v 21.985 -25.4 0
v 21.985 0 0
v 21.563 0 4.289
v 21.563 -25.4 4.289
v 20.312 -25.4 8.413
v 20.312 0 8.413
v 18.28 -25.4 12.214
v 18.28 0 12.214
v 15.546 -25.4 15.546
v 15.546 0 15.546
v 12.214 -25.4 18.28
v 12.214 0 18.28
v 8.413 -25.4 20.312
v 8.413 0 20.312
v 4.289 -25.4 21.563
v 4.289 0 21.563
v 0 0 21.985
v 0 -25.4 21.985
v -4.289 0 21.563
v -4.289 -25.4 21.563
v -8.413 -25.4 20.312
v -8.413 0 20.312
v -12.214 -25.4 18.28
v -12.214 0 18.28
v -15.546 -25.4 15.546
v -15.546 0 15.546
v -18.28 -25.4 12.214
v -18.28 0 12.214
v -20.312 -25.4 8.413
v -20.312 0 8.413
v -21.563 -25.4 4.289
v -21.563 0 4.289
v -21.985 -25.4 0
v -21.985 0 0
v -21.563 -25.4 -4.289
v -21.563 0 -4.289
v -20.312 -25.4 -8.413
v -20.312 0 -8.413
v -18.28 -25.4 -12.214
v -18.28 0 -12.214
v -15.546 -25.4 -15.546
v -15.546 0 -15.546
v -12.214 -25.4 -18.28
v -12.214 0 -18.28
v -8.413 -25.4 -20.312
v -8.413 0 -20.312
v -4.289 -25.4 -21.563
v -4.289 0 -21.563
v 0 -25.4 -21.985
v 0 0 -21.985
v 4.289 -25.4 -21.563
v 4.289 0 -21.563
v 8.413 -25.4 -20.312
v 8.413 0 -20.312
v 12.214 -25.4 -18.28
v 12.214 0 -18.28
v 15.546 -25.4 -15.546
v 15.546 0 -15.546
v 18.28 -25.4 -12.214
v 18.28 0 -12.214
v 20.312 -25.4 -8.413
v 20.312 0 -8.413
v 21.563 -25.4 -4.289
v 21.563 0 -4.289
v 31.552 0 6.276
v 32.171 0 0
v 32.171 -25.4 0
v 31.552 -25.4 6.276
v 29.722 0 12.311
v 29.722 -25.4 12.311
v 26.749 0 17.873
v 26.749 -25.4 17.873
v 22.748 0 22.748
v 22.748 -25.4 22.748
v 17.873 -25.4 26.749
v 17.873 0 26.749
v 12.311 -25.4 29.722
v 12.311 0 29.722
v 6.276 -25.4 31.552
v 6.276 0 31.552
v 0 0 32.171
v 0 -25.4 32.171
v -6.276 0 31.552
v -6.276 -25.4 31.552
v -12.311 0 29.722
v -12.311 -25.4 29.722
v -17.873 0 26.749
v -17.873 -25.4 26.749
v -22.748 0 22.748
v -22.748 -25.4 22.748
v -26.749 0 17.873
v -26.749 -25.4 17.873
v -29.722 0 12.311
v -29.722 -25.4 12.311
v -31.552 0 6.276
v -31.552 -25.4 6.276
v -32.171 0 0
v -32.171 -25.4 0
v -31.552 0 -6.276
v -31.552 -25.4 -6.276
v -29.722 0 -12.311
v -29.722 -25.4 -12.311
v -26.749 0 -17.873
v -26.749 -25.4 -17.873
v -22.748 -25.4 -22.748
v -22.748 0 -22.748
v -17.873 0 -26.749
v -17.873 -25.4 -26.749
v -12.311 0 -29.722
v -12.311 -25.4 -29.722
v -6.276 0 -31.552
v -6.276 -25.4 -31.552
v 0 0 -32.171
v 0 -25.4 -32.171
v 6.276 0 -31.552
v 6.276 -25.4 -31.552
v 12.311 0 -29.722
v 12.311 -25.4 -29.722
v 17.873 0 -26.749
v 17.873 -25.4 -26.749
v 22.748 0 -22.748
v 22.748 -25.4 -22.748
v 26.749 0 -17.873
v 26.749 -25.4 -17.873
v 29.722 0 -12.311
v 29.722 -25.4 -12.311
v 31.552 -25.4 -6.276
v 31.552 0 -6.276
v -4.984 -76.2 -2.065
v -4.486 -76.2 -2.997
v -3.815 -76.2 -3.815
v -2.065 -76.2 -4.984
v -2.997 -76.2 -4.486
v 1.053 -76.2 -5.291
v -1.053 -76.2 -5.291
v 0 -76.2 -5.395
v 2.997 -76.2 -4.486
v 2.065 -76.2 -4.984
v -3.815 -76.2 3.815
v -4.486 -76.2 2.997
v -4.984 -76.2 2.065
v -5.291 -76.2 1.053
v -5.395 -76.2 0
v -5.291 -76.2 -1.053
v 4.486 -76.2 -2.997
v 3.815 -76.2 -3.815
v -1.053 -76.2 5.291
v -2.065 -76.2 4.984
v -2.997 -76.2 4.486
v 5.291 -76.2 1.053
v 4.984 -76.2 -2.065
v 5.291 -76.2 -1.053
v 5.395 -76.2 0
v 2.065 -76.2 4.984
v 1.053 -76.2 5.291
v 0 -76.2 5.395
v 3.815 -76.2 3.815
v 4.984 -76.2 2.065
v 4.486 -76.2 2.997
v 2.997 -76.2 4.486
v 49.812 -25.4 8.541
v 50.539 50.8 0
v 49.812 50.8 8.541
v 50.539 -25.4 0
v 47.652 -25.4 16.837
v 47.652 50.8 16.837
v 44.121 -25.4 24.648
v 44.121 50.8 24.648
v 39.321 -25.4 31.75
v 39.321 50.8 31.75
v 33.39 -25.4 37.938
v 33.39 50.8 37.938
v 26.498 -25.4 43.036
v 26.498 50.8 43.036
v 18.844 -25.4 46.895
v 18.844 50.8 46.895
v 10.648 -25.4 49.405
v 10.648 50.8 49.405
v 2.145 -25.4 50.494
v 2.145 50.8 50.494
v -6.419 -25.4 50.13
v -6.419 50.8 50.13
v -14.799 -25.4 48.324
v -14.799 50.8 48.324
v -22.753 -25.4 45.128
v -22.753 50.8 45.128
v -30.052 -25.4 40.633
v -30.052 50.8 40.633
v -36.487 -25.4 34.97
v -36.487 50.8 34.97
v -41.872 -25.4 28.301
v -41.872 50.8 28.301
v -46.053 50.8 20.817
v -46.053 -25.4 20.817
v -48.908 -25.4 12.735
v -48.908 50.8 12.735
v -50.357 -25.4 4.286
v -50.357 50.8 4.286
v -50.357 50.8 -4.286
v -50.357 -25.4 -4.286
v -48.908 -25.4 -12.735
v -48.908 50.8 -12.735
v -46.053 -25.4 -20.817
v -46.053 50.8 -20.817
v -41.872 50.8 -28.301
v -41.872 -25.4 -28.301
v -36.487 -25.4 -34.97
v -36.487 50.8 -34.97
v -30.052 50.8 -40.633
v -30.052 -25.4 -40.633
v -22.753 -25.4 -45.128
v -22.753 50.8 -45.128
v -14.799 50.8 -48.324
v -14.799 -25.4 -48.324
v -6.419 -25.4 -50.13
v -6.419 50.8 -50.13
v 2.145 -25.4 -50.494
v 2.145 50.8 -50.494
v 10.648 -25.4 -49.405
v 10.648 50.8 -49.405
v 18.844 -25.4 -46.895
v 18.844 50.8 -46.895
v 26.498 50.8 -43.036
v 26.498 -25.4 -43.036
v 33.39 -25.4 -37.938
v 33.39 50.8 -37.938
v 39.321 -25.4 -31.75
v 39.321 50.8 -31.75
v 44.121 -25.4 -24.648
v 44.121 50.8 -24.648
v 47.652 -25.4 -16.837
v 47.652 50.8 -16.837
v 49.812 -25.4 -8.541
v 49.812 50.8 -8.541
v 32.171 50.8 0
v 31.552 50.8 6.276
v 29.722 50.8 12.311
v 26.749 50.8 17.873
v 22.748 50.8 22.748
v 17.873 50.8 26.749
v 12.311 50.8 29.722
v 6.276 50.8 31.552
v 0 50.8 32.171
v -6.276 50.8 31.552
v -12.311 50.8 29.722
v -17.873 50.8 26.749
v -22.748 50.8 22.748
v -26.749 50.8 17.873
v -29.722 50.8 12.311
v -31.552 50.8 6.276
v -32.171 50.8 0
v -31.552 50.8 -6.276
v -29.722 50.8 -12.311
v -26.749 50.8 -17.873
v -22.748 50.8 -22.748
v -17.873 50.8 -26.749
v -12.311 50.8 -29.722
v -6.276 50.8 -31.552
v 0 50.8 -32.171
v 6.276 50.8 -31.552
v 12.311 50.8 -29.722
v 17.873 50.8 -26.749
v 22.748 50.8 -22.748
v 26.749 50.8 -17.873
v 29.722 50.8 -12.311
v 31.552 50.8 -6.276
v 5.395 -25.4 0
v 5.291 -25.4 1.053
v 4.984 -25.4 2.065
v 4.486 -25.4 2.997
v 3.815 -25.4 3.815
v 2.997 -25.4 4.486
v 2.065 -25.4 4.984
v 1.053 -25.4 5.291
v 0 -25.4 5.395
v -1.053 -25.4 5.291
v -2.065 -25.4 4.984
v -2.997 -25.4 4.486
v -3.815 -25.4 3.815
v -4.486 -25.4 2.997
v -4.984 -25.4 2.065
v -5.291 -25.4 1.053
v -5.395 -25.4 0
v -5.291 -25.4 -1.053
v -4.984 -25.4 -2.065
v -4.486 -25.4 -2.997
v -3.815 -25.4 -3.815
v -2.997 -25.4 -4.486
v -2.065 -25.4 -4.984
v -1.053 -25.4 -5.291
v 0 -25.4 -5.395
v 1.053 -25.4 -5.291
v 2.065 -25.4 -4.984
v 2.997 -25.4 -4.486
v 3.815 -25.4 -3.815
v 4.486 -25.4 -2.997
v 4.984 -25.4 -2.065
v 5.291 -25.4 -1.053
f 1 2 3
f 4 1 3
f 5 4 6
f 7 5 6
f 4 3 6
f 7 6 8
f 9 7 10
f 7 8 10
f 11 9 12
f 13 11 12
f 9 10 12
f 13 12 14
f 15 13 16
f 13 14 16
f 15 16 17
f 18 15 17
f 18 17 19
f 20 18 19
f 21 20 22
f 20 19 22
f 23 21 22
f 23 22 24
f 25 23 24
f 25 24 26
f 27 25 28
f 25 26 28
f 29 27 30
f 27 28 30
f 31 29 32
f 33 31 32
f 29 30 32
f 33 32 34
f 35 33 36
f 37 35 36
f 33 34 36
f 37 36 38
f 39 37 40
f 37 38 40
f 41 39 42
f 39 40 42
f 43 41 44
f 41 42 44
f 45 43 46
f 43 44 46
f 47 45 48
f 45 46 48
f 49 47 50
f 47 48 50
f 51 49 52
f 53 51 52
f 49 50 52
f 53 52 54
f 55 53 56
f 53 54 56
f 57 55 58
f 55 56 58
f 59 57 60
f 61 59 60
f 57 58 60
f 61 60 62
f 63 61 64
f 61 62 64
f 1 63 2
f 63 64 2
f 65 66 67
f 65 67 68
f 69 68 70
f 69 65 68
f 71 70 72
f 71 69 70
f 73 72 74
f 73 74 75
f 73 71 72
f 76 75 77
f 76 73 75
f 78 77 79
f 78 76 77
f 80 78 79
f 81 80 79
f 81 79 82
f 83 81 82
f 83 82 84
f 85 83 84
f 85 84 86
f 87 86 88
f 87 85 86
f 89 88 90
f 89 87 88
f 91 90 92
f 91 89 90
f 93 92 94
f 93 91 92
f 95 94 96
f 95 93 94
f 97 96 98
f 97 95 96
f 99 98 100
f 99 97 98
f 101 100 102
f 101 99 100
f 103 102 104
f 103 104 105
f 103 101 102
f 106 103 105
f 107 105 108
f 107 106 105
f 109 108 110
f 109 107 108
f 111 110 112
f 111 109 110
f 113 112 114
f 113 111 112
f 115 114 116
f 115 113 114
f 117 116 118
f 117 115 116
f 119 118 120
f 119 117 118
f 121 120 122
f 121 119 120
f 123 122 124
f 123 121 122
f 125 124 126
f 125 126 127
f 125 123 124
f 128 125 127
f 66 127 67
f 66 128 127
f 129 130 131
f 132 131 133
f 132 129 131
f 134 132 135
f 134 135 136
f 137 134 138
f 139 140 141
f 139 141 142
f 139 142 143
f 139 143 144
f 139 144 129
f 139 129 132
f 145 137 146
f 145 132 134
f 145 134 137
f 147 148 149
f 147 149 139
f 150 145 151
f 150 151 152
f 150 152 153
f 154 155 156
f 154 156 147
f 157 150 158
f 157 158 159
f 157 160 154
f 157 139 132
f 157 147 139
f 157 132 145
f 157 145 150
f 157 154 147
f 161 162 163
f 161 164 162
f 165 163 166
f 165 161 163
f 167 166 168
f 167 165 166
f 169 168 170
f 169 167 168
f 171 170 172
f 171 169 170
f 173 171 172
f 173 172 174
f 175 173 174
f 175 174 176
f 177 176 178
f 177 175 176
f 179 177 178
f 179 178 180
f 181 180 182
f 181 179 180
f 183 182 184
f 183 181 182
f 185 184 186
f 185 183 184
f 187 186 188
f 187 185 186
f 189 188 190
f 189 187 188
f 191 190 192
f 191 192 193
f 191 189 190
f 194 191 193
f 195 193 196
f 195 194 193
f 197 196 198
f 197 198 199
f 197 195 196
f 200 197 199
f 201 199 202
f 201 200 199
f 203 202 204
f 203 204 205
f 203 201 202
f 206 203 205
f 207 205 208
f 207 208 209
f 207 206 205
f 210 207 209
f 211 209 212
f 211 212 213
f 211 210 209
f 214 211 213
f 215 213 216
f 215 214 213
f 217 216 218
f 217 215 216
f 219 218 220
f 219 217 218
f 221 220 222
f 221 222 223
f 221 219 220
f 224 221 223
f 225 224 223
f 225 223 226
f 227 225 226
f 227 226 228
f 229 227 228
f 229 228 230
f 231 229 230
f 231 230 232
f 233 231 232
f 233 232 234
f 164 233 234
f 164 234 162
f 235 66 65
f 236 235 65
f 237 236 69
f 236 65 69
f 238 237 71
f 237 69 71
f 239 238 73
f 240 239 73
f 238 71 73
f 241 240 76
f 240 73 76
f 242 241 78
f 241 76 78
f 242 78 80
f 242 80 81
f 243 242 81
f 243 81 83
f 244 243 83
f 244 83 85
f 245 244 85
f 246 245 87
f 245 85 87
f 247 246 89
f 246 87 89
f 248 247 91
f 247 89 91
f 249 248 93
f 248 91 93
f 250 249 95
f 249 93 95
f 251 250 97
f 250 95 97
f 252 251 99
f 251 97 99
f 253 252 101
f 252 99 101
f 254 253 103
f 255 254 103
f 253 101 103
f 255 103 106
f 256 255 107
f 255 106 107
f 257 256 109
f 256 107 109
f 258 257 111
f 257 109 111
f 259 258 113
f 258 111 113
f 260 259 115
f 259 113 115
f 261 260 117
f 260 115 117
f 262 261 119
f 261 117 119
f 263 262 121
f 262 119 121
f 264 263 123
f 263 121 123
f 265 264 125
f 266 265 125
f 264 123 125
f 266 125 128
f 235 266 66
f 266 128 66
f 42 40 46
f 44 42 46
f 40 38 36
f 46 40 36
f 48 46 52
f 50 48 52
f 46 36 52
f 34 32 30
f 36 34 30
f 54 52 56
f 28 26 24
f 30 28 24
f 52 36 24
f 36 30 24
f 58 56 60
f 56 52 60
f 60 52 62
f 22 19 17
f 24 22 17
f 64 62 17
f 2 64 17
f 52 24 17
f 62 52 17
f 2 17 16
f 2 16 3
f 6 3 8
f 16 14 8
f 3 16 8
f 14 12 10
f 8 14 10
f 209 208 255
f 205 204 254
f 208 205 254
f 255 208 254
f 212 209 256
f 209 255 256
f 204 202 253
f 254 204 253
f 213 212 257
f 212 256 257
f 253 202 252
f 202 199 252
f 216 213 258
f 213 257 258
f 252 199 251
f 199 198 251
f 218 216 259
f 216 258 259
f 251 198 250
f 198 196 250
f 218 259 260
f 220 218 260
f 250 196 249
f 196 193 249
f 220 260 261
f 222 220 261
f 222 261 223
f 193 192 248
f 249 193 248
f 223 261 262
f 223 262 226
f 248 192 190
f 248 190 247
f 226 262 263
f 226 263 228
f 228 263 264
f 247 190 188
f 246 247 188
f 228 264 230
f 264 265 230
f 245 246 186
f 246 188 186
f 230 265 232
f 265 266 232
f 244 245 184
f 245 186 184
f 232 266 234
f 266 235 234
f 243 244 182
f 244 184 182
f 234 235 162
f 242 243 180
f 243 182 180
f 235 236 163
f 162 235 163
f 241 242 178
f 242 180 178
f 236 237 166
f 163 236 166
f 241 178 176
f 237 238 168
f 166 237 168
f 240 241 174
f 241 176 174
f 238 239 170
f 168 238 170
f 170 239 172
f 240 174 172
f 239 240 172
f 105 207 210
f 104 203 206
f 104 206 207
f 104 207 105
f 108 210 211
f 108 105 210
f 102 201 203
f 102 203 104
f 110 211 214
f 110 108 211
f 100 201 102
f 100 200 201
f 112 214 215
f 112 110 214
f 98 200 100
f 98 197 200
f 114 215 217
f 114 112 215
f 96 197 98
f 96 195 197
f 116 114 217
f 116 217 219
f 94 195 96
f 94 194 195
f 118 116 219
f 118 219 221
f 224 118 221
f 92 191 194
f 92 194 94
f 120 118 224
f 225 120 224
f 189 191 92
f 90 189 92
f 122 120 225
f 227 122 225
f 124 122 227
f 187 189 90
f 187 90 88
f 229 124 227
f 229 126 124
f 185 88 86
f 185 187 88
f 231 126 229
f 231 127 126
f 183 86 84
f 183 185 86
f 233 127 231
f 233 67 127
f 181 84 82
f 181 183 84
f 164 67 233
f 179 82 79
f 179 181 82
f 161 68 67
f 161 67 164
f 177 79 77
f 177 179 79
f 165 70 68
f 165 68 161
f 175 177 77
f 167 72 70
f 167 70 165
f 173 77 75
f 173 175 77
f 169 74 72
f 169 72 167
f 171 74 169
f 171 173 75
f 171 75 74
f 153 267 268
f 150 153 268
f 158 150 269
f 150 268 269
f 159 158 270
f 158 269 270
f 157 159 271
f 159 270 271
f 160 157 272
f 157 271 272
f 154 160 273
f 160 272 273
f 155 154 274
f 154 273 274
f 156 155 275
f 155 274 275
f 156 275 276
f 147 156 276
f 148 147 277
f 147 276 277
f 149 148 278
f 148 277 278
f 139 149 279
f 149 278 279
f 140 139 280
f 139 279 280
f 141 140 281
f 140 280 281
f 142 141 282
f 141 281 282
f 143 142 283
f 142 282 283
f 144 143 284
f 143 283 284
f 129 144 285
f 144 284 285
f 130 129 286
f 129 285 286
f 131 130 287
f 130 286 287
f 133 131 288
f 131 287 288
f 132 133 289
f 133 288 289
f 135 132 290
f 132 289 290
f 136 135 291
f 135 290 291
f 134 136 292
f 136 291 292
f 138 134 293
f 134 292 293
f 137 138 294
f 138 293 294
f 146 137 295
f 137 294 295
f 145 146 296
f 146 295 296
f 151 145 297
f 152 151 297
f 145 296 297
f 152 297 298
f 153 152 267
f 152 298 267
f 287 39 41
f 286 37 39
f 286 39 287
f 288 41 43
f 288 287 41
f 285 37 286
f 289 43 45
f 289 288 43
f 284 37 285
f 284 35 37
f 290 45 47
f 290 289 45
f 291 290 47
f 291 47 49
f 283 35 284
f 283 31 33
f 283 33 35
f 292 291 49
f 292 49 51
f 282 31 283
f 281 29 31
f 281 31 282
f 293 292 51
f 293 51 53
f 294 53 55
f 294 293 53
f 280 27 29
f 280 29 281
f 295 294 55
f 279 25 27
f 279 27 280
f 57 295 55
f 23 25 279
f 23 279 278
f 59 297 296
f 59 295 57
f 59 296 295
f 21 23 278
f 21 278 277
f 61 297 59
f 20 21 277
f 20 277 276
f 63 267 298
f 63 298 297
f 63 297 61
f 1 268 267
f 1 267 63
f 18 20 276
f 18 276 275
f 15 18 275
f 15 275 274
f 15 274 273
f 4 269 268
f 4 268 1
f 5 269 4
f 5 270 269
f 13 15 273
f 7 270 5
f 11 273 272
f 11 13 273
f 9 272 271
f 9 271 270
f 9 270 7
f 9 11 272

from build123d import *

# Parameters (mm, degrees)
F0_R     = 50.5391757453
F0_R_2   = 32.1706102907
F1_DEPTH = 25.4
F0_R_3   = 5.3950374824
F2_DEPTH = 50.8
F3_DEPTH = 50.8
F4_R     = 21.9853928035
F5_DEPTH = 25.4


with BuildPart() as f1:
    # F0 (on Front) → F1 (new body)
    with BuildSketch(Plane.XZ):
        Circle(F0_R)
        Circle(F0_R_2, mode=Mode.SUBTRACT)
    extrude(amount=F1_DEPTH)

    # F3 (add): a face of the model
    f3_faces = [f1.faces().sort_by_distance(p)[0] for p in [
        (-49.1097119899, 0, 0),
    ]]
    extrude(f3_faces, amount=F3_DEPTH)


with BuildPart() as f1b:
    # F0 (on Front) → F1, piece 2 (new body)
    with BuildSketch(Plane.XZ):
        Circle(F0_R_3)
    extrude(amount=F1_DEPTH)

    # F2 (add): a face of the model
    f2_faces = [f1b.faces().sort_by_distance(p)[0] for p in [
        (0, -25.4, 0),
    ]]
    extrude(f2_faces, amount=F2_DEPTH)

    # F4 (on Front) → F5 (join)
    with BuildSketch(Plane.XZ):
        Circle(F4_R)
    extrude(amount=F5_DEPTH)


solid = Compound([f1.part, f1b.part])
